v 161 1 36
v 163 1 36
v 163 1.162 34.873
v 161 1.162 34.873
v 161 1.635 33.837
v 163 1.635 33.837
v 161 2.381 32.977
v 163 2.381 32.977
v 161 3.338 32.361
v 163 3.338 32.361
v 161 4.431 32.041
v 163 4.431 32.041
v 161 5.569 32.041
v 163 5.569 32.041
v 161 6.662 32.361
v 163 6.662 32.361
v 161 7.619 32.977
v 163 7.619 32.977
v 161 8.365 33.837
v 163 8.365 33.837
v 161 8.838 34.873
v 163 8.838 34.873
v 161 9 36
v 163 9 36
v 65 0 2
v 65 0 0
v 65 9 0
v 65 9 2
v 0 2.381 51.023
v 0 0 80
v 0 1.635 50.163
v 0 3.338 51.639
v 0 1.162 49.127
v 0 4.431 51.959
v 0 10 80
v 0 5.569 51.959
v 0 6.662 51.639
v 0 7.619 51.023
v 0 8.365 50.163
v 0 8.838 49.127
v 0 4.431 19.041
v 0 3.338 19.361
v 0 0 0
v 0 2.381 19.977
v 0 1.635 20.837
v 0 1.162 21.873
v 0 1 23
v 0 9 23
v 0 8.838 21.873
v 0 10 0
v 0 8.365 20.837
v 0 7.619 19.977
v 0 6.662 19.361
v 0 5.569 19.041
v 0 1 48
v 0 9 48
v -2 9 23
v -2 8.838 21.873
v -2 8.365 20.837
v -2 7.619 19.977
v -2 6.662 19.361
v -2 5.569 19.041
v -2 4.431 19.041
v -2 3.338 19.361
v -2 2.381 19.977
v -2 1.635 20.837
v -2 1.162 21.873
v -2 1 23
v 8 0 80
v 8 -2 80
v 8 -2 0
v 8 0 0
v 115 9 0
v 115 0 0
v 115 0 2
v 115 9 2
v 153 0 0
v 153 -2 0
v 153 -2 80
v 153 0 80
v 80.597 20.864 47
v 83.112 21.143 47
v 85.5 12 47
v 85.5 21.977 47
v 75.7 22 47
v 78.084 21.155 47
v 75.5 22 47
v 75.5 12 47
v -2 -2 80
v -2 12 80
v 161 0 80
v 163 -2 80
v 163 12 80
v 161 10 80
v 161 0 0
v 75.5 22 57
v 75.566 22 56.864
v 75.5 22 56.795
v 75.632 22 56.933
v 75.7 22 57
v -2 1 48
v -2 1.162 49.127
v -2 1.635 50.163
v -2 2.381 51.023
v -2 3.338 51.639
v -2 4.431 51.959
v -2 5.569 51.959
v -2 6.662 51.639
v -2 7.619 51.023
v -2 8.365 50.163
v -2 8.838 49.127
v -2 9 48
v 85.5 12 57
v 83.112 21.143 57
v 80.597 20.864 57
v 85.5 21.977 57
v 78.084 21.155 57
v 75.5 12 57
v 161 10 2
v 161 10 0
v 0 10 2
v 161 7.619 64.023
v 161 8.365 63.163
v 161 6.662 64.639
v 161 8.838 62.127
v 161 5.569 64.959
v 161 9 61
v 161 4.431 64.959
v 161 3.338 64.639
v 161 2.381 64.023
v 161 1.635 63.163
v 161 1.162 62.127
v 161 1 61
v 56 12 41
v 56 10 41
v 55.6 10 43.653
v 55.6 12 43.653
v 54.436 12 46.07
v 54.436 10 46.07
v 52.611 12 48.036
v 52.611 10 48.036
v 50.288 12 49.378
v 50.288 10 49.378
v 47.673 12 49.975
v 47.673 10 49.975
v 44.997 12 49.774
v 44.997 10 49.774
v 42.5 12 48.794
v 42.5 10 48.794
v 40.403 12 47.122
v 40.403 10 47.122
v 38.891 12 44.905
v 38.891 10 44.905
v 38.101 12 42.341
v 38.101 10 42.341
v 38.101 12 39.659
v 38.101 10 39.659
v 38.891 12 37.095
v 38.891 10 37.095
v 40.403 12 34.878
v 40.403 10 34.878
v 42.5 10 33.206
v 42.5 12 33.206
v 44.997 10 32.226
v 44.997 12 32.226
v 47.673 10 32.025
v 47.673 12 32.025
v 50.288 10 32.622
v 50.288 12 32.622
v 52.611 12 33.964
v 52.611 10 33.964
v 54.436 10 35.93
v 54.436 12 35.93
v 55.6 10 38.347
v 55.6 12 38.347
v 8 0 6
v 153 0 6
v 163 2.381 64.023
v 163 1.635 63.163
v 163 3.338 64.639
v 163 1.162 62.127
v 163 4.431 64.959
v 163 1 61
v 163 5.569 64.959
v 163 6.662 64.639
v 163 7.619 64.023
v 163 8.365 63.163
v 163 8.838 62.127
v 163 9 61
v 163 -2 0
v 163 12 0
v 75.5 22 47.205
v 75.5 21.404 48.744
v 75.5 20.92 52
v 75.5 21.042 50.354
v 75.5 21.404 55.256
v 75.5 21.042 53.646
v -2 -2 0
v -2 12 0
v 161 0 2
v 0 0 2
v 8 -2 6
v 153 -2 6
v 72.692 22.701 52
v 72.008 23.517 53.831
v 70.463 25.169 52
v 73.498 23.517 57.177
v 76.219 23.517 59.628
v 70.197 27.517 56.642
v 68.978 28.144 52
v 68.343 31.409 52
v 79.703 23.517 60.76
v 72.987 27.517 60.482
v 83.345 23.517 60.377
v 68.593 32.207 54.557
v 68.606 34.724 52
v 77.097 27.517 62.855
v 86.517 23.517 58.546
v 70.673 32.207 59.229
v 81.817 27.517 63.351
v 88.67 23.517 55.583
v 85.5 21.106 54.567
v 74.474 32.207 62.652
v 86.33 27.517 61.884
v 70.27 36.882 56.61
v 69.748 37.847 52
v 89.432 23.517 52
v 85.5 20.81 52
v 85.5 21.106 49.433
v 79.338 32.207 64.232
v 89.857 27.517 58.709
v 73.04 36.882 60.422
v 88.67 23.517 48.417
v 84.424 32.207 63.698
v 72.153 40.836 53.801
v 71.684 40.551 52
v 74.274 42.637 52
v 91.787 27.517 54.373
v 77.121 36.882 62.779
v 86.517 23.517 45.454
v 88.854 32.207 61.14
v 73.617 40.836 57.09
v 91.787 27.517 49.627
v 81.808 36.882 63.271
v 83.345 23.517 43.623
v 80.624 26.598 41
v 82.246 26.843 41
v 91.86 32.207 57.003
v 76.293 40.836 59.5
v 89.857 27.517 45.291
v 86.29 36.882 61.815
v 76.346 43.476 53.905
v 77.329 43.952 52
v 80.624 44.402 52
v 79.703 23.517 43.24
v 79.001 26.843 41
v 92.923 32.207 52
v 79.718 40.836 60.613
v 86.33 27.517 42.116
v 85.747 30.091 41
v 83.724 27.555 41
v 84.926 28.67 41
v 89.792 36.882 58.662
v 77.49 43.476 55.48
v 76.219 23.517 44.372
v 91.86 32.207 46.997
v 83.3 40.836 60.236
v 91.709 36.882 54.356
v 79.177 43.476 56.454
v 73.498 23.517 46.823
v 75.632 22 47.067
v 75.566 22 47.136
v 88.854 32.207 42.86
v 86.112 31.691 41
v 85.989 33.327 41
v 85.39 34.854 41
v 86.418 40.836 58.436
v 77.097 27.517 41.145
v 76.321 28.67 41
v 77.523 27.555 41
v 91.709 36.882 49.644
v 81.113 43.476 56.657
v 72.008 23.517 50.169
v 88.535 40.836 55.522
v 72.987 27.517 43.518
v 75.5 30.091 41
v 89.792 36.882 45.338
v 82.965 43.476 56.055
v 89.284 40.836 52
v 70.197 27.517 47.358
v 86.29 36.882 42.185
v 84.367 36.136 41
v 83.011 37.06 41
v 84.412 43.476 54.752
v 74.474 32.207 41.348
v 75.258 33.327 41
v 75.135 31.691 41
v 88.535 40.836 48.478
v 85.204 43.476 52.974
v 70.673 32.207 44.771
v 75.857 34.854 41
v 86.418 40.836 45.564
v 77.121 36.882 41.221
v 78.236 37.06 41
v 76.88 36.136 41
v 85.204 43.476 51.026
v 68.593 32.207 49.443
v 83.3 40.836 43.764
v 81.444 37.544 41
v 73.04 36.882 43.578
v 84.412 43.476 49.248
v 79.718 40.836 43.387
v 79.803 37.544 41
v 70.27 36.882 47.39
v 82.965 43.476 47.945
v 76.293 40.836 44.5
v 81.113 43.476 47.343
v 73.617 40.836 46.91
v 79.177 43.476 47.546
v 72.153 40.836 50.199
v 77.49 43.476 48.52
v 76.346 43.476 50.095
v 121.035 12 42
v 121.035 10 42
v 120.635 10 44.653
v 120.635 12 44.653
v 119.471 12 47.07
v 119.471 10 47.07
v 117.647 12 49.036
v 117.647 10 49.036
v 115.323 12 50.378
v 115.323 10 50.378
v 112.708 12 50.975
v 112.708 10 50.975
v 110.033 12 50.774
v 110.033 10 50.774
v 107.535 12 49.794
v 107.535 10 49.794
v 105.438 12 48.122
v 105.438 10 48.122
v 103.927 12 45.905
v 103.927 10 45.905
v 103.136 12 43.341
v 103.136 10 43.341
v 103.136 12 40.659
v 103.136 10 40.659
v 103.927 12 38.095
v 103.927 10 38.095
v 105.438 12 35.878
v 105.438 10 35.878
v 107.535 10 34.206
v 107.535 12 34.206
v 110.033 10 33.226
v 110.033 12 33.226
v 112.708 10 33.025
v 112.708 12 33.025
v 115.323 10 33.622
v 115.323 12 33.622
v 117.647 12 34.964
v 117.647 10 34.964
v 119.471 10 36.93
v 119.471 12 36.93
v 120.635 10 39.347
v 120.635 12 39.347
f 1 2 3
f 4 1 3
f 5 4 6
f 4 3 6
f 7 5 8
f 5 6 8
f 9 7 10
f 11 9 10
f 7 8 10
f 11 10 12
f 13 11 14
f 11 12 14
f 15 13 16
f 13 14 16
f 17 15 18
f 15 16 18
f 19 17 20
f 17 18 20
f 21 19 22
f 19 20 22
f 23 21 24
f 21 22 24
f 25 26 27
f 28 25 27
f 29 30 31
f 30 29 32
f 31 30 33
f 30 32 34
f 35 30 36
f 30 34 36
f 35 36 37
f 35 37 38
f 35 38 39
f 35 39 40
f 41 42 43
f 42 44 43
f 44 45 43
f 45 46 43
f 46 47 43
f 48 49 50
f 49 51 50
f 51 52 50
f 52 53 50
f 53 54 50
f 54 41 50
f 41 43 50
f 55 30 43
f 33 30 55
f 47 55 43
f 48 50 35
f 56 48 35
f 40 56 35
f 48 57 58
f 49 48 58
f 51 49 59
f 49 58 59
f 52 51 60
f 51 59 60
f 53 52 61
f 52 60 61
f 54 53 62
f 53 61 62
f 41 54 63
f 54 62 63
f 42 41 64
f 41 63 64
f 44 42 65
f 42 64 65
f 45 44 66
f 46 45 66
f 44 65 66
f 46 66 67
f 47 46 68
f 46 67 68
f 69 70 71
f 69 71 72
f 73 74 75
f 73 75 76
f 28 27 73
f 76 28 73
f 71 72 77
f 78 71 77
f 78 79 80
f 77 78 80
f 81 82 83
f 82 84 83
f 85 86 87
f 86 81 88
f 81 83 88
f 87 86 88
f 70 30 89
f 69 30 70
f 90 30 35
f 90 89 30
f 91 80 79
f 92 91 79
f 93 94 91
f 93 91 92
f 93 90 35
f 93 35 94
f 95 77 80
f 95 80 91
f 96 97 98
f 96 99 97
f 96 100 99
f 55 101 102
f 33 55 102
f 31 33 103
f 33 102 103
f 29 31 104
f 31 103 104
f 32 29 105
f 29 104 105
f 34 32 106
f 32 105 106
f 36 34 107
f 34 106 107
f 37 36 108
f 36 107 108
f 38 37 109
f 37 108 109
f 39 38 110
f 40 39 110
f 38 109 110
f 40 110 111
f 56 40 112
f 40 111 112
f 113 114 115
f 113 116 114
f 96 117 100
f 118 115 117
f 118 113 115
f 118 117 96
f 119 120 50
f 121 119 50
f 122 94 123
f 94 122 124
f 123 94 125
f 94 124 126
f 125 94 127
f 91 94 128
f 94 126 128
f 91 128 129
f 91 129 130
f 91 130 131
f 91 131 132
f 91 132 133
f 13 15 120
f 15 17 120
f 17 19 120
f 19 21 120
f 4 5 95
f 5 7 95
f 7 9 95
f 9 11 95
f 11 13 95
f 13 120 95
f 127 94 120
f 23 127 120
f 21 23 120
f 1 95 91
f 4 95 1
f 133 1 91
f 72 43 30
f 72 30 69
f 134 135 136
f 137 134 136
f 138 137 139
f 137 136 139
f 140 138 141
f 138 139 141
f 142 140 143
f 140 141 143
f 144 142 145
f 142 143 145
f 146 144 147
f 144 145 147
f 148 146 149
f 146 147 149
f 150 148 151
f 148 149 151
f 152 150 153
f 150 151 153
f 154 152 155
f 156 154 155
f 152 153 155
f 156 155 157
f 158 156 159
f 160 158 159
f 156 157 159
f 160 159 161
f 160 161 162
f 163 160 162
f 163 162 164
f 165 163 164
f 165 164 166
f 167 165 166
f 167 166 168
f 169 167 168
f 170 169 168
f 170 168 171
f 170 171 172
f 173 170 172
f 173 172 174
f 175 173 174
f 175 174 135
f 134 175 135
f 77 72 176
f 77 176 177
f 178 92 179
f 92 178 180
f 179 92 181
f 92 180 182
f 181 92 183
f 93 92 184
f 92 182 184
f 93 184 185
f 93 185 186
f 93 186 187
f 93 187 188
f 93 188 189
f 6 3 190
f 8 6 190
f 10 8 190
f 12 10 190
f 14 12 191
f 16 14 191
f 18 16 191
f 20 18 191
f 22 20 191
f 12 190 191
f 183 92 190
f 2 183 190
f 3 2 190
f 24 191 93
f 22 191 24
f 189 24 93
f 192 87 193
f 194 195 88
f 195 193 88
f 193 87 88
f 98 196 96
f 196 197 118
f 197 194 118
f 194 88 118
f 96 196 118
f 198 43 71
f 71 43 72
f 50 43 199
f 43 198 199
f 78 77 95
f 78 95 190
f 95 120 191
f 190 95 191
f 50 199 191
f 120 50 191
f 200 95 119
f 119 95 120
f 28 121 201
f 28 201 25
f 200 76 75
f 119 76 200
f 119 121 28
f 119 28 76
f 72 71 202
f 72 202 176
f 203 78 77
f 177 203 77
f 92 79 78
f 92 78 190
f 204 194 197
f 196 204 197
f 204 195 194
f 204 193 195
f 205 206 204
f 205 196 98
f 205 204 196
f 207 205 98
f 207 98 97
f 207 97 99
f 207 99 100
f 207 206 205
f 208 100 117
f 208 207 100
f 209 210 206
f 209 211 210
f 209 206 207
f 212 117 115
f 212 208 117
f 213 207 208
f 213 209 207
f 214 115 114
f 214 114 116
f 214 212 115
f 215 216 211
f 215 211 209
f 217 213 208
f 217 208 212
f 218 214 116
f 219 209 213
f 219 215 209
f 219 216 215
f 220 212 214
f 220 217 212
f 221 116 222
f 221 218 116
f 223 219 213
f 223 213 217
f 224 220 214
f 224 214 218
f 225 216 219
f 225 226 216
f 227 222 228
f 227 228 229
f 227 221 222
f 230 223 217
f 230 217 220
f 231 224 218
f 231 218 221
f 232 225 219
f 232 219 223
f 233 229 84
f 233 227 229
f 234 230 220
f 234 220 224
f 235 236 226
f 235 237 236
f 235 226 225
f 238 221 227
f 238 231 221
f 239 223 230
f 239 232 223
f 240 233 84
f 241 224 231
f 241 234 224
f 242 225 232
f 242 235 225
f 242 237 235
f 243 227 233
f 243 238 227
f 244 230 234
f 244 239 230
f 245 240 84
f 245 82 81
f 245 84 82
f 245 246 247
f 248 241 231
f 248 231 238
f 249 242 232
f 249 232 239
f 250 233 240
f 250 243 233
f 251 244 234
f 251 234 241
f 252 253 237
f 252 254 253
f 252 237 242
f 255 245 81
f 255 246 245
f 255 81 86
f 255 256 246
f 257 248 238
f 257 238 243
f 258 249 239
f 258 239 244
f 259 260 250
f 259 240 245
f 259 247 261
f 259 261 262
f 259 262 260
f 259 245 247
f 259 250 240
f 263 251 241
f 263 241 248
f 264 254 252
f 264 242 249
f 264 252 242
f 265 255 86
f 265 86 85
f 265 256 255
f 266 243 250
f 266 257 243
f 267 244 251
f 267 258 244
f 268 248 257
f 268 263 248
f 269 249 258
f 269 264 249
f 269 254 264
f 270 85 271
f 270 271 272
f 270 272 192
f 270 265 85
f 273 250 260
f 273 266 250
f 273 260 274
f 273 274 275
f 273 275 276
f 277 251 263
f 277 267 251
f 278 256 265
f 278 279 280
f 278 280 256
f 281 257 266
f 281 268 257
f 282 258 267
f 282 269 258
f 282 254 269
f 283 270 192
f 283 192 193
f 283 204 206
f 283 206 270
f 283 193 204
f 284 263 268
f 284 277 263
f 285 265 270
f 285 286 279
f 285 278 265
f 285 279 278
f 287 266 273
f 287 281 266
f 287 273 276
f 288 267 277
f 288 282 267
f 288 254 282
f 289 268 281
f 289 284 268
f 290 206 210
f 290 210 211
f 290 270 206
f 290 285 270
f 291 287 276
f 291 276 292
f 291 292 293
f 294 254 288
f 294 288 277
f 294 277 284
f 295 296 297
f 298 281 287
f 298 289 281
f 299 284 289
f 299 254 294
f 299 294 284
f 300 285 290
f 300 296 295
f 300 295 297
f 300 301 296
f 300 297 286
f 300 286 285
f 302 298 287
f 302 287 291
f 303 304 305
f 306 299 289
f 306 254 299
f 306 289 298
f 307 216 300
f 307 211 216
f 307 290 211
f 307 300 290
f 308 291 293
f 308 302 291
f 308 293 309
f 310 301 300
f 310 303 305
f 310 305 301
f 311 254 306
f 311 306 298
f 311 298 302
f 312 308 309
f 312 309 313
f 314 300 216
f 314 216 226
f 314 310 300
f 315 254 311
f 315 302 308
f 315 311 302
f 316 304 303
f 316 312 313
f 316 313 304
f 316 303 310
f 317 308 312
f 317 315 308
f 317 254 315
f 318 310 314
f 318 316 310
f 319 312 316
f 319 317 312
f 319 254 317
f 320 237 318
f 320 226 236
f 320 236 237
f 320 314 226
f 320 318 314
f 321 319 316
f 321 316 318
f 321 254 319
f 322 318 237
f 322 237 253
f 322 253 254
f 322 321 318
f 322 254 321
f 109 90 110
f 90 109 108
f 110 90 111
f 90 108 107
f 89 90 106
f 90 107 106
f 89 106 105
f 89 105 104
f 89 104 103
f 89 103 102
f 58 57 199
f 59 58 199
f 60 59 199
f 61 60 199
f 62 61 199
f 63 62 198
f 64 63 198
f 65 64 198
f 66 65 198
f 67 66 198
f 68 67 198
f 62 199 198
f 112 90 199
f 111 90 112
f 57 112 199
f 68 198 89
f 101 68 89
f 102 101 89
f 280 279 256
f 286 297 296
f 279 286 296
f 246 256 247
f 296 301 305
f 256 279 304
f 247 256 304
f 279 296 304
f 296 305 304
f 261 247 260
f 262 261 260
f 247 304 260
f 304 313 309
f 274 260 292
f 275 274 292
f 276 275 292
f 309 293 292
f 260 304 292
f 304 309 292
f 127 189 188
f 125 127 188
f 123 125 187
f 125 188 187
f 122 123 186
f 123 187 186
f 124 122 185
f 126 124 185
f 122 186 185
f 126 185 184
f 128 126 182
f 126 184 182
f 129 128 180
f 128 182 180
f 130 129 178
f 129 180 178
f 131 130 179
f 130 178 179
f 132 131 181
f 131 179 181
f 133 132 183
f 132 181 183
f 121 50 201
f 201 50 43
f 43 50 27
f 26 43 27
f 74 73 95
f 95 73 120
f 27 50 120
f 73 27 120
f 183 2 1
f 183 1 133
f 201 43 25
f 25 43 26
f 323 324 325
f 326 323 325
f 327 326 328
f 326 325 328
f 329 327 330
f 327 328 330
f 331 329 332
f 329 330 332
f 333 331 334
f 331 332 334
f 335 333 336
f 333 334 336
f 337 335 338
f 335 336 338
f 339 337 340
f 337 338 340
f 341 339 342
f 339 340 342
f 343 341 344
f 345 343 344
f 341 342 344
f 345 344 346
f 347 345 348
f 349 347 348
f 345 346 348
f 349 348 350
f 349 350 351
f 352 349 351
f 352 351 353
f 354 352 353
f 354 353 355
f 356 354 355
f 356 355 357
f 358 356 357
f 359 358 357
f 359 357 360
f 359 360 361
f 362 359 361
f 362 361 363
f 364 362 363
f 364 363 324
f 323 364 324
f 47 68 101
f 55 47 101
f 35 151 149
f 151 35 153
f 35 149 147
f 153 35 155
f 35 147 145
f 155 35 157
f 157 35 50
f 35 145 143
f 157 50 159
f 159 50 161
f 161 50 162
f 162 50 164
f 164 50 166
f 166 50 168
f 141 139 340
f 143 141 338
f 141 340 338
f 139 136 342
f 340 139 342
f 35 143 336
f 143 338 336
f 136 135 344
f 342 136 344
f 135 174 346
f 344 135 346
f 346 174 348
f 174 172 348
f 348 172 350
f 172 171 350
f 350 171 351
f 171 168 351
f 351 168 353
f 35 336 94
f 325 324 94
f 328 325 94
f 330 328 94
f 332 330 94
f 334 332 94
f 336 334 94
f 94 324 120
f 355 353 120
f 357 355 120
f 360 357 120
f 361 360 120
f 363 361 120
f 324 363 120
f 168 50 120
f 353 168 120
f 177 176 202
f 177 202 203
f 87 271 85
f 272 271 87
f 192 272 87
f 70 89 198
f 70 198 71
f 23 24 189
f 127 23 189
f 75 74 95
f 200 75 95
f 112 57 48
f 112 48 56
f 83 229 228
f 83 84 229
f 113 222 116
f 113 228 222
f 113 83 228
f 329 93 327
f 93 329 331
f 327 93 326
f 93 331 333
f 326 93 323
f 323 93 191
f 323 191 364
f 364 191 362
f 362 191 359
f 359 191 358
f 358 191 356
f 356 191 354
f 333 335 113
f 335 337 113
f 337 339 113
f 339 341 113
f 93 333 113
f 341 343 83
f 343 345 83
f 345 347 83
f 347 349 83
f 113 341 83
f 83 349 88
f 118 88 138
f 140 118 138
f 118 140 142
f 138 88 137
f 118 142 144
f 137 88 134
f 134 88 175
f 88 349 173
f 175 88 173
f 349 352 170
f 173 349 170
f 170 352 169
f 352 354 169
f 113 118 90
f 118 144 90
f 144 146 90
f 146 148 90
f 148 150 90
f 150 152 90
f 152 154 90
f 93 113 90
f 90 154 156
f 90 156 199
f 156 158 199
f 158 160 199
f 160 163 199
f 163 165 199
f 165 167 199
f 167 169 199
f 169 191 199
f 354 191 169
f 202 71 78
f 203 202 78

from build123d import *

# Parameters (mm, degrees)
F0_W      = 161
F0_H      = 2
F0_W_2    = 2
F0_H_2    = 10
F0_W_3    = 8
F1_DEPTH  = 80
F2_DEPTH  = 2
F0_W_4    = 145
F3_DEPTH  = 6
F4_W      = 8
F4_H      = 25
F5_DEPTH  = 2
F6_W      = 8
F6_H      = 25
F7_DEPTH  = 2
F8_R      = 9
F9_DEPTH  = 12.001
F11_W     = 50
F11_H     = 9
F12_DEPTH = 2
F10_W     = 10
F10_H     = 10
F13_DEPTH = 10
F18_W     = 28.0327871442
F18_H     = 26.7418082803
F19_DEPTH = 41


with BuildPart() as f1:
    # F0 (on Top) → F1 (new body)
    with BuildSketch(Plane.XY):
        with Locations((80.5, 11)):
            Rectangle(F0_W, F0_H)
        with Locations((162, 11)):
            Rectangle(F0_W_2, F0_H)
        with Locations((162, 5)):
            Rectangle(F0_W_2, F0_H_2)
        with Locations((162, -1)):
            Rectangle(F0_W_2, F0_H)
        with Locations((157, -1)):
            Rectangle(F0_W_3, F0_H)
        with Locations((-1, 11)):
            Rectangle(F0_W_2, F0_H)
        with Locations((-1, 5)):
            Rectangle(F0_W_2, F0_H_2)
        with Locations((-1, -1)):
            Rectangle(F0_W_2, F0_H)
        with Locations((4, -1)):
            Rectangle(F0_W_3, F0_H)
    extrude(amount=F1_DEPTH)

    # F4 (on face) → F5 (cut, through all)
    with BuildSketch(Plane(origin=(-2, 0, 0), x_dir=(0, -1, 0), z_dir=(-1, 0, 0))):
        with BuildLine():
            ThreePointArc((-1, 48), (-5, 52), (-9, 48))
            Line((-9, 48), (-1, 48))
        make_face()
        with Locations((-5, 35.5)):
            Rectangle(F4_W, F4_H)
        with BuildLine():
            Line((-1, 23), (-9, 23))
            ThreePointArc((-9, 23), (-5, 19), (-1, 23))
        make_face()
    extrude(amount=-F5_DEPTH, mode=Mode.SUBTRACT)

    # F6 (on face) → F7 (cut, through all)
    with BuildSketch(Plane.YZ.offset(163)):
        with BuildLine():
            ThreePointArc((9, 61), (5, 65), (1, 61))
            Line((1, 61), (9, 61))
        make_face()
        with Locations((5, 48.5)):
            Rectangle(F6_W, F6_H)
        with BuildLine():
            Line((9, 36), (1, 36))
            ThreePointArc((1, 36), (5, 32), (9, 36))
        make_face()
    extrude(amount=-F7_DEPTH, mode=Mode.SUBTRACT)

    # F8 (on Front) → F9 (cut, through all)
    with BuildSketch(Plane.XZ):
        with Locations((47, 41)):
            Circle(F8_R)
        with Locations((112.0353415608, 42)):
            Circle(F8_R)
    extrude(amount=-F9_DEPTH, mode=Mode.SUBTRACT)

    # F10 (on face) → F13 (join)
    with BuildSketch(Plane(origin=(0, 12, 0), x_dir=(-1, 0, 0), z_dir=(0, 1, 0))):
        with Locations((-80.5, 52)):
            Rectangle(F10_W, F10_H)
    extrude(amount=F13_DEPTH)

    # F16 (on line) → F17 (revolve)
    with BuildSketch(Plane(origin=(0, 0, 52), x_dir=(1, 0, 0), z_dir=(0, 0, -1))):
        with BuildLine():
            Line((80.6235447526, -44.4018882096), (80.6235447526, -19.8018882096))
            ThreePointArc((80.6235447526, -19.8018882096), (68.3235447526, -32.1018882096), (80.6235447526, -44.4018882096))
        make_face()
    revolve(axis=Axis((80.6235447526, 32.1018882096, 52), (0, 1, 0)))

    # F18 (on Top) → F19 (cut)
    with BuildSketch(Plane.XY):
        with Locations((81.3463069499, 32.6434457675)):
            Rectangle(F18_W, F18_H)
    extrude(amount=F19_DEPTH, mode=Mode.SUBTRACT)


with BuildPart() as f2:
    # F0 (on Top) → F2 (new body)
    with BuildSketch(Plane.XY):
        Polygon((0, 10), (0, 0), (8, 0), (153, 0), (161, 0), (161, 10), align=None)
    extrude(amount=F2_DEPTH)

    # F11 (on face) → F12 (cut, through all)
    with BuildSketch(Plane.XY):
        with Locations((90, 4.5)):
            Rectangle(F11_W, F11_H)
    extrude(amount=F12_DEPTH, mode=Mode.SUBTRACT)


with BuildPart() as f3:
    # F0 (on Top) → F3 (new body)
    with BuildSketch(Plane.XY):
        with Locations((80.5, -1)):
            Rectangle(F0_W_4, F0_H)
    extrude(amount=F3_DEPTH)


solid = Compound([f1.part, f2.part, f3.part])
